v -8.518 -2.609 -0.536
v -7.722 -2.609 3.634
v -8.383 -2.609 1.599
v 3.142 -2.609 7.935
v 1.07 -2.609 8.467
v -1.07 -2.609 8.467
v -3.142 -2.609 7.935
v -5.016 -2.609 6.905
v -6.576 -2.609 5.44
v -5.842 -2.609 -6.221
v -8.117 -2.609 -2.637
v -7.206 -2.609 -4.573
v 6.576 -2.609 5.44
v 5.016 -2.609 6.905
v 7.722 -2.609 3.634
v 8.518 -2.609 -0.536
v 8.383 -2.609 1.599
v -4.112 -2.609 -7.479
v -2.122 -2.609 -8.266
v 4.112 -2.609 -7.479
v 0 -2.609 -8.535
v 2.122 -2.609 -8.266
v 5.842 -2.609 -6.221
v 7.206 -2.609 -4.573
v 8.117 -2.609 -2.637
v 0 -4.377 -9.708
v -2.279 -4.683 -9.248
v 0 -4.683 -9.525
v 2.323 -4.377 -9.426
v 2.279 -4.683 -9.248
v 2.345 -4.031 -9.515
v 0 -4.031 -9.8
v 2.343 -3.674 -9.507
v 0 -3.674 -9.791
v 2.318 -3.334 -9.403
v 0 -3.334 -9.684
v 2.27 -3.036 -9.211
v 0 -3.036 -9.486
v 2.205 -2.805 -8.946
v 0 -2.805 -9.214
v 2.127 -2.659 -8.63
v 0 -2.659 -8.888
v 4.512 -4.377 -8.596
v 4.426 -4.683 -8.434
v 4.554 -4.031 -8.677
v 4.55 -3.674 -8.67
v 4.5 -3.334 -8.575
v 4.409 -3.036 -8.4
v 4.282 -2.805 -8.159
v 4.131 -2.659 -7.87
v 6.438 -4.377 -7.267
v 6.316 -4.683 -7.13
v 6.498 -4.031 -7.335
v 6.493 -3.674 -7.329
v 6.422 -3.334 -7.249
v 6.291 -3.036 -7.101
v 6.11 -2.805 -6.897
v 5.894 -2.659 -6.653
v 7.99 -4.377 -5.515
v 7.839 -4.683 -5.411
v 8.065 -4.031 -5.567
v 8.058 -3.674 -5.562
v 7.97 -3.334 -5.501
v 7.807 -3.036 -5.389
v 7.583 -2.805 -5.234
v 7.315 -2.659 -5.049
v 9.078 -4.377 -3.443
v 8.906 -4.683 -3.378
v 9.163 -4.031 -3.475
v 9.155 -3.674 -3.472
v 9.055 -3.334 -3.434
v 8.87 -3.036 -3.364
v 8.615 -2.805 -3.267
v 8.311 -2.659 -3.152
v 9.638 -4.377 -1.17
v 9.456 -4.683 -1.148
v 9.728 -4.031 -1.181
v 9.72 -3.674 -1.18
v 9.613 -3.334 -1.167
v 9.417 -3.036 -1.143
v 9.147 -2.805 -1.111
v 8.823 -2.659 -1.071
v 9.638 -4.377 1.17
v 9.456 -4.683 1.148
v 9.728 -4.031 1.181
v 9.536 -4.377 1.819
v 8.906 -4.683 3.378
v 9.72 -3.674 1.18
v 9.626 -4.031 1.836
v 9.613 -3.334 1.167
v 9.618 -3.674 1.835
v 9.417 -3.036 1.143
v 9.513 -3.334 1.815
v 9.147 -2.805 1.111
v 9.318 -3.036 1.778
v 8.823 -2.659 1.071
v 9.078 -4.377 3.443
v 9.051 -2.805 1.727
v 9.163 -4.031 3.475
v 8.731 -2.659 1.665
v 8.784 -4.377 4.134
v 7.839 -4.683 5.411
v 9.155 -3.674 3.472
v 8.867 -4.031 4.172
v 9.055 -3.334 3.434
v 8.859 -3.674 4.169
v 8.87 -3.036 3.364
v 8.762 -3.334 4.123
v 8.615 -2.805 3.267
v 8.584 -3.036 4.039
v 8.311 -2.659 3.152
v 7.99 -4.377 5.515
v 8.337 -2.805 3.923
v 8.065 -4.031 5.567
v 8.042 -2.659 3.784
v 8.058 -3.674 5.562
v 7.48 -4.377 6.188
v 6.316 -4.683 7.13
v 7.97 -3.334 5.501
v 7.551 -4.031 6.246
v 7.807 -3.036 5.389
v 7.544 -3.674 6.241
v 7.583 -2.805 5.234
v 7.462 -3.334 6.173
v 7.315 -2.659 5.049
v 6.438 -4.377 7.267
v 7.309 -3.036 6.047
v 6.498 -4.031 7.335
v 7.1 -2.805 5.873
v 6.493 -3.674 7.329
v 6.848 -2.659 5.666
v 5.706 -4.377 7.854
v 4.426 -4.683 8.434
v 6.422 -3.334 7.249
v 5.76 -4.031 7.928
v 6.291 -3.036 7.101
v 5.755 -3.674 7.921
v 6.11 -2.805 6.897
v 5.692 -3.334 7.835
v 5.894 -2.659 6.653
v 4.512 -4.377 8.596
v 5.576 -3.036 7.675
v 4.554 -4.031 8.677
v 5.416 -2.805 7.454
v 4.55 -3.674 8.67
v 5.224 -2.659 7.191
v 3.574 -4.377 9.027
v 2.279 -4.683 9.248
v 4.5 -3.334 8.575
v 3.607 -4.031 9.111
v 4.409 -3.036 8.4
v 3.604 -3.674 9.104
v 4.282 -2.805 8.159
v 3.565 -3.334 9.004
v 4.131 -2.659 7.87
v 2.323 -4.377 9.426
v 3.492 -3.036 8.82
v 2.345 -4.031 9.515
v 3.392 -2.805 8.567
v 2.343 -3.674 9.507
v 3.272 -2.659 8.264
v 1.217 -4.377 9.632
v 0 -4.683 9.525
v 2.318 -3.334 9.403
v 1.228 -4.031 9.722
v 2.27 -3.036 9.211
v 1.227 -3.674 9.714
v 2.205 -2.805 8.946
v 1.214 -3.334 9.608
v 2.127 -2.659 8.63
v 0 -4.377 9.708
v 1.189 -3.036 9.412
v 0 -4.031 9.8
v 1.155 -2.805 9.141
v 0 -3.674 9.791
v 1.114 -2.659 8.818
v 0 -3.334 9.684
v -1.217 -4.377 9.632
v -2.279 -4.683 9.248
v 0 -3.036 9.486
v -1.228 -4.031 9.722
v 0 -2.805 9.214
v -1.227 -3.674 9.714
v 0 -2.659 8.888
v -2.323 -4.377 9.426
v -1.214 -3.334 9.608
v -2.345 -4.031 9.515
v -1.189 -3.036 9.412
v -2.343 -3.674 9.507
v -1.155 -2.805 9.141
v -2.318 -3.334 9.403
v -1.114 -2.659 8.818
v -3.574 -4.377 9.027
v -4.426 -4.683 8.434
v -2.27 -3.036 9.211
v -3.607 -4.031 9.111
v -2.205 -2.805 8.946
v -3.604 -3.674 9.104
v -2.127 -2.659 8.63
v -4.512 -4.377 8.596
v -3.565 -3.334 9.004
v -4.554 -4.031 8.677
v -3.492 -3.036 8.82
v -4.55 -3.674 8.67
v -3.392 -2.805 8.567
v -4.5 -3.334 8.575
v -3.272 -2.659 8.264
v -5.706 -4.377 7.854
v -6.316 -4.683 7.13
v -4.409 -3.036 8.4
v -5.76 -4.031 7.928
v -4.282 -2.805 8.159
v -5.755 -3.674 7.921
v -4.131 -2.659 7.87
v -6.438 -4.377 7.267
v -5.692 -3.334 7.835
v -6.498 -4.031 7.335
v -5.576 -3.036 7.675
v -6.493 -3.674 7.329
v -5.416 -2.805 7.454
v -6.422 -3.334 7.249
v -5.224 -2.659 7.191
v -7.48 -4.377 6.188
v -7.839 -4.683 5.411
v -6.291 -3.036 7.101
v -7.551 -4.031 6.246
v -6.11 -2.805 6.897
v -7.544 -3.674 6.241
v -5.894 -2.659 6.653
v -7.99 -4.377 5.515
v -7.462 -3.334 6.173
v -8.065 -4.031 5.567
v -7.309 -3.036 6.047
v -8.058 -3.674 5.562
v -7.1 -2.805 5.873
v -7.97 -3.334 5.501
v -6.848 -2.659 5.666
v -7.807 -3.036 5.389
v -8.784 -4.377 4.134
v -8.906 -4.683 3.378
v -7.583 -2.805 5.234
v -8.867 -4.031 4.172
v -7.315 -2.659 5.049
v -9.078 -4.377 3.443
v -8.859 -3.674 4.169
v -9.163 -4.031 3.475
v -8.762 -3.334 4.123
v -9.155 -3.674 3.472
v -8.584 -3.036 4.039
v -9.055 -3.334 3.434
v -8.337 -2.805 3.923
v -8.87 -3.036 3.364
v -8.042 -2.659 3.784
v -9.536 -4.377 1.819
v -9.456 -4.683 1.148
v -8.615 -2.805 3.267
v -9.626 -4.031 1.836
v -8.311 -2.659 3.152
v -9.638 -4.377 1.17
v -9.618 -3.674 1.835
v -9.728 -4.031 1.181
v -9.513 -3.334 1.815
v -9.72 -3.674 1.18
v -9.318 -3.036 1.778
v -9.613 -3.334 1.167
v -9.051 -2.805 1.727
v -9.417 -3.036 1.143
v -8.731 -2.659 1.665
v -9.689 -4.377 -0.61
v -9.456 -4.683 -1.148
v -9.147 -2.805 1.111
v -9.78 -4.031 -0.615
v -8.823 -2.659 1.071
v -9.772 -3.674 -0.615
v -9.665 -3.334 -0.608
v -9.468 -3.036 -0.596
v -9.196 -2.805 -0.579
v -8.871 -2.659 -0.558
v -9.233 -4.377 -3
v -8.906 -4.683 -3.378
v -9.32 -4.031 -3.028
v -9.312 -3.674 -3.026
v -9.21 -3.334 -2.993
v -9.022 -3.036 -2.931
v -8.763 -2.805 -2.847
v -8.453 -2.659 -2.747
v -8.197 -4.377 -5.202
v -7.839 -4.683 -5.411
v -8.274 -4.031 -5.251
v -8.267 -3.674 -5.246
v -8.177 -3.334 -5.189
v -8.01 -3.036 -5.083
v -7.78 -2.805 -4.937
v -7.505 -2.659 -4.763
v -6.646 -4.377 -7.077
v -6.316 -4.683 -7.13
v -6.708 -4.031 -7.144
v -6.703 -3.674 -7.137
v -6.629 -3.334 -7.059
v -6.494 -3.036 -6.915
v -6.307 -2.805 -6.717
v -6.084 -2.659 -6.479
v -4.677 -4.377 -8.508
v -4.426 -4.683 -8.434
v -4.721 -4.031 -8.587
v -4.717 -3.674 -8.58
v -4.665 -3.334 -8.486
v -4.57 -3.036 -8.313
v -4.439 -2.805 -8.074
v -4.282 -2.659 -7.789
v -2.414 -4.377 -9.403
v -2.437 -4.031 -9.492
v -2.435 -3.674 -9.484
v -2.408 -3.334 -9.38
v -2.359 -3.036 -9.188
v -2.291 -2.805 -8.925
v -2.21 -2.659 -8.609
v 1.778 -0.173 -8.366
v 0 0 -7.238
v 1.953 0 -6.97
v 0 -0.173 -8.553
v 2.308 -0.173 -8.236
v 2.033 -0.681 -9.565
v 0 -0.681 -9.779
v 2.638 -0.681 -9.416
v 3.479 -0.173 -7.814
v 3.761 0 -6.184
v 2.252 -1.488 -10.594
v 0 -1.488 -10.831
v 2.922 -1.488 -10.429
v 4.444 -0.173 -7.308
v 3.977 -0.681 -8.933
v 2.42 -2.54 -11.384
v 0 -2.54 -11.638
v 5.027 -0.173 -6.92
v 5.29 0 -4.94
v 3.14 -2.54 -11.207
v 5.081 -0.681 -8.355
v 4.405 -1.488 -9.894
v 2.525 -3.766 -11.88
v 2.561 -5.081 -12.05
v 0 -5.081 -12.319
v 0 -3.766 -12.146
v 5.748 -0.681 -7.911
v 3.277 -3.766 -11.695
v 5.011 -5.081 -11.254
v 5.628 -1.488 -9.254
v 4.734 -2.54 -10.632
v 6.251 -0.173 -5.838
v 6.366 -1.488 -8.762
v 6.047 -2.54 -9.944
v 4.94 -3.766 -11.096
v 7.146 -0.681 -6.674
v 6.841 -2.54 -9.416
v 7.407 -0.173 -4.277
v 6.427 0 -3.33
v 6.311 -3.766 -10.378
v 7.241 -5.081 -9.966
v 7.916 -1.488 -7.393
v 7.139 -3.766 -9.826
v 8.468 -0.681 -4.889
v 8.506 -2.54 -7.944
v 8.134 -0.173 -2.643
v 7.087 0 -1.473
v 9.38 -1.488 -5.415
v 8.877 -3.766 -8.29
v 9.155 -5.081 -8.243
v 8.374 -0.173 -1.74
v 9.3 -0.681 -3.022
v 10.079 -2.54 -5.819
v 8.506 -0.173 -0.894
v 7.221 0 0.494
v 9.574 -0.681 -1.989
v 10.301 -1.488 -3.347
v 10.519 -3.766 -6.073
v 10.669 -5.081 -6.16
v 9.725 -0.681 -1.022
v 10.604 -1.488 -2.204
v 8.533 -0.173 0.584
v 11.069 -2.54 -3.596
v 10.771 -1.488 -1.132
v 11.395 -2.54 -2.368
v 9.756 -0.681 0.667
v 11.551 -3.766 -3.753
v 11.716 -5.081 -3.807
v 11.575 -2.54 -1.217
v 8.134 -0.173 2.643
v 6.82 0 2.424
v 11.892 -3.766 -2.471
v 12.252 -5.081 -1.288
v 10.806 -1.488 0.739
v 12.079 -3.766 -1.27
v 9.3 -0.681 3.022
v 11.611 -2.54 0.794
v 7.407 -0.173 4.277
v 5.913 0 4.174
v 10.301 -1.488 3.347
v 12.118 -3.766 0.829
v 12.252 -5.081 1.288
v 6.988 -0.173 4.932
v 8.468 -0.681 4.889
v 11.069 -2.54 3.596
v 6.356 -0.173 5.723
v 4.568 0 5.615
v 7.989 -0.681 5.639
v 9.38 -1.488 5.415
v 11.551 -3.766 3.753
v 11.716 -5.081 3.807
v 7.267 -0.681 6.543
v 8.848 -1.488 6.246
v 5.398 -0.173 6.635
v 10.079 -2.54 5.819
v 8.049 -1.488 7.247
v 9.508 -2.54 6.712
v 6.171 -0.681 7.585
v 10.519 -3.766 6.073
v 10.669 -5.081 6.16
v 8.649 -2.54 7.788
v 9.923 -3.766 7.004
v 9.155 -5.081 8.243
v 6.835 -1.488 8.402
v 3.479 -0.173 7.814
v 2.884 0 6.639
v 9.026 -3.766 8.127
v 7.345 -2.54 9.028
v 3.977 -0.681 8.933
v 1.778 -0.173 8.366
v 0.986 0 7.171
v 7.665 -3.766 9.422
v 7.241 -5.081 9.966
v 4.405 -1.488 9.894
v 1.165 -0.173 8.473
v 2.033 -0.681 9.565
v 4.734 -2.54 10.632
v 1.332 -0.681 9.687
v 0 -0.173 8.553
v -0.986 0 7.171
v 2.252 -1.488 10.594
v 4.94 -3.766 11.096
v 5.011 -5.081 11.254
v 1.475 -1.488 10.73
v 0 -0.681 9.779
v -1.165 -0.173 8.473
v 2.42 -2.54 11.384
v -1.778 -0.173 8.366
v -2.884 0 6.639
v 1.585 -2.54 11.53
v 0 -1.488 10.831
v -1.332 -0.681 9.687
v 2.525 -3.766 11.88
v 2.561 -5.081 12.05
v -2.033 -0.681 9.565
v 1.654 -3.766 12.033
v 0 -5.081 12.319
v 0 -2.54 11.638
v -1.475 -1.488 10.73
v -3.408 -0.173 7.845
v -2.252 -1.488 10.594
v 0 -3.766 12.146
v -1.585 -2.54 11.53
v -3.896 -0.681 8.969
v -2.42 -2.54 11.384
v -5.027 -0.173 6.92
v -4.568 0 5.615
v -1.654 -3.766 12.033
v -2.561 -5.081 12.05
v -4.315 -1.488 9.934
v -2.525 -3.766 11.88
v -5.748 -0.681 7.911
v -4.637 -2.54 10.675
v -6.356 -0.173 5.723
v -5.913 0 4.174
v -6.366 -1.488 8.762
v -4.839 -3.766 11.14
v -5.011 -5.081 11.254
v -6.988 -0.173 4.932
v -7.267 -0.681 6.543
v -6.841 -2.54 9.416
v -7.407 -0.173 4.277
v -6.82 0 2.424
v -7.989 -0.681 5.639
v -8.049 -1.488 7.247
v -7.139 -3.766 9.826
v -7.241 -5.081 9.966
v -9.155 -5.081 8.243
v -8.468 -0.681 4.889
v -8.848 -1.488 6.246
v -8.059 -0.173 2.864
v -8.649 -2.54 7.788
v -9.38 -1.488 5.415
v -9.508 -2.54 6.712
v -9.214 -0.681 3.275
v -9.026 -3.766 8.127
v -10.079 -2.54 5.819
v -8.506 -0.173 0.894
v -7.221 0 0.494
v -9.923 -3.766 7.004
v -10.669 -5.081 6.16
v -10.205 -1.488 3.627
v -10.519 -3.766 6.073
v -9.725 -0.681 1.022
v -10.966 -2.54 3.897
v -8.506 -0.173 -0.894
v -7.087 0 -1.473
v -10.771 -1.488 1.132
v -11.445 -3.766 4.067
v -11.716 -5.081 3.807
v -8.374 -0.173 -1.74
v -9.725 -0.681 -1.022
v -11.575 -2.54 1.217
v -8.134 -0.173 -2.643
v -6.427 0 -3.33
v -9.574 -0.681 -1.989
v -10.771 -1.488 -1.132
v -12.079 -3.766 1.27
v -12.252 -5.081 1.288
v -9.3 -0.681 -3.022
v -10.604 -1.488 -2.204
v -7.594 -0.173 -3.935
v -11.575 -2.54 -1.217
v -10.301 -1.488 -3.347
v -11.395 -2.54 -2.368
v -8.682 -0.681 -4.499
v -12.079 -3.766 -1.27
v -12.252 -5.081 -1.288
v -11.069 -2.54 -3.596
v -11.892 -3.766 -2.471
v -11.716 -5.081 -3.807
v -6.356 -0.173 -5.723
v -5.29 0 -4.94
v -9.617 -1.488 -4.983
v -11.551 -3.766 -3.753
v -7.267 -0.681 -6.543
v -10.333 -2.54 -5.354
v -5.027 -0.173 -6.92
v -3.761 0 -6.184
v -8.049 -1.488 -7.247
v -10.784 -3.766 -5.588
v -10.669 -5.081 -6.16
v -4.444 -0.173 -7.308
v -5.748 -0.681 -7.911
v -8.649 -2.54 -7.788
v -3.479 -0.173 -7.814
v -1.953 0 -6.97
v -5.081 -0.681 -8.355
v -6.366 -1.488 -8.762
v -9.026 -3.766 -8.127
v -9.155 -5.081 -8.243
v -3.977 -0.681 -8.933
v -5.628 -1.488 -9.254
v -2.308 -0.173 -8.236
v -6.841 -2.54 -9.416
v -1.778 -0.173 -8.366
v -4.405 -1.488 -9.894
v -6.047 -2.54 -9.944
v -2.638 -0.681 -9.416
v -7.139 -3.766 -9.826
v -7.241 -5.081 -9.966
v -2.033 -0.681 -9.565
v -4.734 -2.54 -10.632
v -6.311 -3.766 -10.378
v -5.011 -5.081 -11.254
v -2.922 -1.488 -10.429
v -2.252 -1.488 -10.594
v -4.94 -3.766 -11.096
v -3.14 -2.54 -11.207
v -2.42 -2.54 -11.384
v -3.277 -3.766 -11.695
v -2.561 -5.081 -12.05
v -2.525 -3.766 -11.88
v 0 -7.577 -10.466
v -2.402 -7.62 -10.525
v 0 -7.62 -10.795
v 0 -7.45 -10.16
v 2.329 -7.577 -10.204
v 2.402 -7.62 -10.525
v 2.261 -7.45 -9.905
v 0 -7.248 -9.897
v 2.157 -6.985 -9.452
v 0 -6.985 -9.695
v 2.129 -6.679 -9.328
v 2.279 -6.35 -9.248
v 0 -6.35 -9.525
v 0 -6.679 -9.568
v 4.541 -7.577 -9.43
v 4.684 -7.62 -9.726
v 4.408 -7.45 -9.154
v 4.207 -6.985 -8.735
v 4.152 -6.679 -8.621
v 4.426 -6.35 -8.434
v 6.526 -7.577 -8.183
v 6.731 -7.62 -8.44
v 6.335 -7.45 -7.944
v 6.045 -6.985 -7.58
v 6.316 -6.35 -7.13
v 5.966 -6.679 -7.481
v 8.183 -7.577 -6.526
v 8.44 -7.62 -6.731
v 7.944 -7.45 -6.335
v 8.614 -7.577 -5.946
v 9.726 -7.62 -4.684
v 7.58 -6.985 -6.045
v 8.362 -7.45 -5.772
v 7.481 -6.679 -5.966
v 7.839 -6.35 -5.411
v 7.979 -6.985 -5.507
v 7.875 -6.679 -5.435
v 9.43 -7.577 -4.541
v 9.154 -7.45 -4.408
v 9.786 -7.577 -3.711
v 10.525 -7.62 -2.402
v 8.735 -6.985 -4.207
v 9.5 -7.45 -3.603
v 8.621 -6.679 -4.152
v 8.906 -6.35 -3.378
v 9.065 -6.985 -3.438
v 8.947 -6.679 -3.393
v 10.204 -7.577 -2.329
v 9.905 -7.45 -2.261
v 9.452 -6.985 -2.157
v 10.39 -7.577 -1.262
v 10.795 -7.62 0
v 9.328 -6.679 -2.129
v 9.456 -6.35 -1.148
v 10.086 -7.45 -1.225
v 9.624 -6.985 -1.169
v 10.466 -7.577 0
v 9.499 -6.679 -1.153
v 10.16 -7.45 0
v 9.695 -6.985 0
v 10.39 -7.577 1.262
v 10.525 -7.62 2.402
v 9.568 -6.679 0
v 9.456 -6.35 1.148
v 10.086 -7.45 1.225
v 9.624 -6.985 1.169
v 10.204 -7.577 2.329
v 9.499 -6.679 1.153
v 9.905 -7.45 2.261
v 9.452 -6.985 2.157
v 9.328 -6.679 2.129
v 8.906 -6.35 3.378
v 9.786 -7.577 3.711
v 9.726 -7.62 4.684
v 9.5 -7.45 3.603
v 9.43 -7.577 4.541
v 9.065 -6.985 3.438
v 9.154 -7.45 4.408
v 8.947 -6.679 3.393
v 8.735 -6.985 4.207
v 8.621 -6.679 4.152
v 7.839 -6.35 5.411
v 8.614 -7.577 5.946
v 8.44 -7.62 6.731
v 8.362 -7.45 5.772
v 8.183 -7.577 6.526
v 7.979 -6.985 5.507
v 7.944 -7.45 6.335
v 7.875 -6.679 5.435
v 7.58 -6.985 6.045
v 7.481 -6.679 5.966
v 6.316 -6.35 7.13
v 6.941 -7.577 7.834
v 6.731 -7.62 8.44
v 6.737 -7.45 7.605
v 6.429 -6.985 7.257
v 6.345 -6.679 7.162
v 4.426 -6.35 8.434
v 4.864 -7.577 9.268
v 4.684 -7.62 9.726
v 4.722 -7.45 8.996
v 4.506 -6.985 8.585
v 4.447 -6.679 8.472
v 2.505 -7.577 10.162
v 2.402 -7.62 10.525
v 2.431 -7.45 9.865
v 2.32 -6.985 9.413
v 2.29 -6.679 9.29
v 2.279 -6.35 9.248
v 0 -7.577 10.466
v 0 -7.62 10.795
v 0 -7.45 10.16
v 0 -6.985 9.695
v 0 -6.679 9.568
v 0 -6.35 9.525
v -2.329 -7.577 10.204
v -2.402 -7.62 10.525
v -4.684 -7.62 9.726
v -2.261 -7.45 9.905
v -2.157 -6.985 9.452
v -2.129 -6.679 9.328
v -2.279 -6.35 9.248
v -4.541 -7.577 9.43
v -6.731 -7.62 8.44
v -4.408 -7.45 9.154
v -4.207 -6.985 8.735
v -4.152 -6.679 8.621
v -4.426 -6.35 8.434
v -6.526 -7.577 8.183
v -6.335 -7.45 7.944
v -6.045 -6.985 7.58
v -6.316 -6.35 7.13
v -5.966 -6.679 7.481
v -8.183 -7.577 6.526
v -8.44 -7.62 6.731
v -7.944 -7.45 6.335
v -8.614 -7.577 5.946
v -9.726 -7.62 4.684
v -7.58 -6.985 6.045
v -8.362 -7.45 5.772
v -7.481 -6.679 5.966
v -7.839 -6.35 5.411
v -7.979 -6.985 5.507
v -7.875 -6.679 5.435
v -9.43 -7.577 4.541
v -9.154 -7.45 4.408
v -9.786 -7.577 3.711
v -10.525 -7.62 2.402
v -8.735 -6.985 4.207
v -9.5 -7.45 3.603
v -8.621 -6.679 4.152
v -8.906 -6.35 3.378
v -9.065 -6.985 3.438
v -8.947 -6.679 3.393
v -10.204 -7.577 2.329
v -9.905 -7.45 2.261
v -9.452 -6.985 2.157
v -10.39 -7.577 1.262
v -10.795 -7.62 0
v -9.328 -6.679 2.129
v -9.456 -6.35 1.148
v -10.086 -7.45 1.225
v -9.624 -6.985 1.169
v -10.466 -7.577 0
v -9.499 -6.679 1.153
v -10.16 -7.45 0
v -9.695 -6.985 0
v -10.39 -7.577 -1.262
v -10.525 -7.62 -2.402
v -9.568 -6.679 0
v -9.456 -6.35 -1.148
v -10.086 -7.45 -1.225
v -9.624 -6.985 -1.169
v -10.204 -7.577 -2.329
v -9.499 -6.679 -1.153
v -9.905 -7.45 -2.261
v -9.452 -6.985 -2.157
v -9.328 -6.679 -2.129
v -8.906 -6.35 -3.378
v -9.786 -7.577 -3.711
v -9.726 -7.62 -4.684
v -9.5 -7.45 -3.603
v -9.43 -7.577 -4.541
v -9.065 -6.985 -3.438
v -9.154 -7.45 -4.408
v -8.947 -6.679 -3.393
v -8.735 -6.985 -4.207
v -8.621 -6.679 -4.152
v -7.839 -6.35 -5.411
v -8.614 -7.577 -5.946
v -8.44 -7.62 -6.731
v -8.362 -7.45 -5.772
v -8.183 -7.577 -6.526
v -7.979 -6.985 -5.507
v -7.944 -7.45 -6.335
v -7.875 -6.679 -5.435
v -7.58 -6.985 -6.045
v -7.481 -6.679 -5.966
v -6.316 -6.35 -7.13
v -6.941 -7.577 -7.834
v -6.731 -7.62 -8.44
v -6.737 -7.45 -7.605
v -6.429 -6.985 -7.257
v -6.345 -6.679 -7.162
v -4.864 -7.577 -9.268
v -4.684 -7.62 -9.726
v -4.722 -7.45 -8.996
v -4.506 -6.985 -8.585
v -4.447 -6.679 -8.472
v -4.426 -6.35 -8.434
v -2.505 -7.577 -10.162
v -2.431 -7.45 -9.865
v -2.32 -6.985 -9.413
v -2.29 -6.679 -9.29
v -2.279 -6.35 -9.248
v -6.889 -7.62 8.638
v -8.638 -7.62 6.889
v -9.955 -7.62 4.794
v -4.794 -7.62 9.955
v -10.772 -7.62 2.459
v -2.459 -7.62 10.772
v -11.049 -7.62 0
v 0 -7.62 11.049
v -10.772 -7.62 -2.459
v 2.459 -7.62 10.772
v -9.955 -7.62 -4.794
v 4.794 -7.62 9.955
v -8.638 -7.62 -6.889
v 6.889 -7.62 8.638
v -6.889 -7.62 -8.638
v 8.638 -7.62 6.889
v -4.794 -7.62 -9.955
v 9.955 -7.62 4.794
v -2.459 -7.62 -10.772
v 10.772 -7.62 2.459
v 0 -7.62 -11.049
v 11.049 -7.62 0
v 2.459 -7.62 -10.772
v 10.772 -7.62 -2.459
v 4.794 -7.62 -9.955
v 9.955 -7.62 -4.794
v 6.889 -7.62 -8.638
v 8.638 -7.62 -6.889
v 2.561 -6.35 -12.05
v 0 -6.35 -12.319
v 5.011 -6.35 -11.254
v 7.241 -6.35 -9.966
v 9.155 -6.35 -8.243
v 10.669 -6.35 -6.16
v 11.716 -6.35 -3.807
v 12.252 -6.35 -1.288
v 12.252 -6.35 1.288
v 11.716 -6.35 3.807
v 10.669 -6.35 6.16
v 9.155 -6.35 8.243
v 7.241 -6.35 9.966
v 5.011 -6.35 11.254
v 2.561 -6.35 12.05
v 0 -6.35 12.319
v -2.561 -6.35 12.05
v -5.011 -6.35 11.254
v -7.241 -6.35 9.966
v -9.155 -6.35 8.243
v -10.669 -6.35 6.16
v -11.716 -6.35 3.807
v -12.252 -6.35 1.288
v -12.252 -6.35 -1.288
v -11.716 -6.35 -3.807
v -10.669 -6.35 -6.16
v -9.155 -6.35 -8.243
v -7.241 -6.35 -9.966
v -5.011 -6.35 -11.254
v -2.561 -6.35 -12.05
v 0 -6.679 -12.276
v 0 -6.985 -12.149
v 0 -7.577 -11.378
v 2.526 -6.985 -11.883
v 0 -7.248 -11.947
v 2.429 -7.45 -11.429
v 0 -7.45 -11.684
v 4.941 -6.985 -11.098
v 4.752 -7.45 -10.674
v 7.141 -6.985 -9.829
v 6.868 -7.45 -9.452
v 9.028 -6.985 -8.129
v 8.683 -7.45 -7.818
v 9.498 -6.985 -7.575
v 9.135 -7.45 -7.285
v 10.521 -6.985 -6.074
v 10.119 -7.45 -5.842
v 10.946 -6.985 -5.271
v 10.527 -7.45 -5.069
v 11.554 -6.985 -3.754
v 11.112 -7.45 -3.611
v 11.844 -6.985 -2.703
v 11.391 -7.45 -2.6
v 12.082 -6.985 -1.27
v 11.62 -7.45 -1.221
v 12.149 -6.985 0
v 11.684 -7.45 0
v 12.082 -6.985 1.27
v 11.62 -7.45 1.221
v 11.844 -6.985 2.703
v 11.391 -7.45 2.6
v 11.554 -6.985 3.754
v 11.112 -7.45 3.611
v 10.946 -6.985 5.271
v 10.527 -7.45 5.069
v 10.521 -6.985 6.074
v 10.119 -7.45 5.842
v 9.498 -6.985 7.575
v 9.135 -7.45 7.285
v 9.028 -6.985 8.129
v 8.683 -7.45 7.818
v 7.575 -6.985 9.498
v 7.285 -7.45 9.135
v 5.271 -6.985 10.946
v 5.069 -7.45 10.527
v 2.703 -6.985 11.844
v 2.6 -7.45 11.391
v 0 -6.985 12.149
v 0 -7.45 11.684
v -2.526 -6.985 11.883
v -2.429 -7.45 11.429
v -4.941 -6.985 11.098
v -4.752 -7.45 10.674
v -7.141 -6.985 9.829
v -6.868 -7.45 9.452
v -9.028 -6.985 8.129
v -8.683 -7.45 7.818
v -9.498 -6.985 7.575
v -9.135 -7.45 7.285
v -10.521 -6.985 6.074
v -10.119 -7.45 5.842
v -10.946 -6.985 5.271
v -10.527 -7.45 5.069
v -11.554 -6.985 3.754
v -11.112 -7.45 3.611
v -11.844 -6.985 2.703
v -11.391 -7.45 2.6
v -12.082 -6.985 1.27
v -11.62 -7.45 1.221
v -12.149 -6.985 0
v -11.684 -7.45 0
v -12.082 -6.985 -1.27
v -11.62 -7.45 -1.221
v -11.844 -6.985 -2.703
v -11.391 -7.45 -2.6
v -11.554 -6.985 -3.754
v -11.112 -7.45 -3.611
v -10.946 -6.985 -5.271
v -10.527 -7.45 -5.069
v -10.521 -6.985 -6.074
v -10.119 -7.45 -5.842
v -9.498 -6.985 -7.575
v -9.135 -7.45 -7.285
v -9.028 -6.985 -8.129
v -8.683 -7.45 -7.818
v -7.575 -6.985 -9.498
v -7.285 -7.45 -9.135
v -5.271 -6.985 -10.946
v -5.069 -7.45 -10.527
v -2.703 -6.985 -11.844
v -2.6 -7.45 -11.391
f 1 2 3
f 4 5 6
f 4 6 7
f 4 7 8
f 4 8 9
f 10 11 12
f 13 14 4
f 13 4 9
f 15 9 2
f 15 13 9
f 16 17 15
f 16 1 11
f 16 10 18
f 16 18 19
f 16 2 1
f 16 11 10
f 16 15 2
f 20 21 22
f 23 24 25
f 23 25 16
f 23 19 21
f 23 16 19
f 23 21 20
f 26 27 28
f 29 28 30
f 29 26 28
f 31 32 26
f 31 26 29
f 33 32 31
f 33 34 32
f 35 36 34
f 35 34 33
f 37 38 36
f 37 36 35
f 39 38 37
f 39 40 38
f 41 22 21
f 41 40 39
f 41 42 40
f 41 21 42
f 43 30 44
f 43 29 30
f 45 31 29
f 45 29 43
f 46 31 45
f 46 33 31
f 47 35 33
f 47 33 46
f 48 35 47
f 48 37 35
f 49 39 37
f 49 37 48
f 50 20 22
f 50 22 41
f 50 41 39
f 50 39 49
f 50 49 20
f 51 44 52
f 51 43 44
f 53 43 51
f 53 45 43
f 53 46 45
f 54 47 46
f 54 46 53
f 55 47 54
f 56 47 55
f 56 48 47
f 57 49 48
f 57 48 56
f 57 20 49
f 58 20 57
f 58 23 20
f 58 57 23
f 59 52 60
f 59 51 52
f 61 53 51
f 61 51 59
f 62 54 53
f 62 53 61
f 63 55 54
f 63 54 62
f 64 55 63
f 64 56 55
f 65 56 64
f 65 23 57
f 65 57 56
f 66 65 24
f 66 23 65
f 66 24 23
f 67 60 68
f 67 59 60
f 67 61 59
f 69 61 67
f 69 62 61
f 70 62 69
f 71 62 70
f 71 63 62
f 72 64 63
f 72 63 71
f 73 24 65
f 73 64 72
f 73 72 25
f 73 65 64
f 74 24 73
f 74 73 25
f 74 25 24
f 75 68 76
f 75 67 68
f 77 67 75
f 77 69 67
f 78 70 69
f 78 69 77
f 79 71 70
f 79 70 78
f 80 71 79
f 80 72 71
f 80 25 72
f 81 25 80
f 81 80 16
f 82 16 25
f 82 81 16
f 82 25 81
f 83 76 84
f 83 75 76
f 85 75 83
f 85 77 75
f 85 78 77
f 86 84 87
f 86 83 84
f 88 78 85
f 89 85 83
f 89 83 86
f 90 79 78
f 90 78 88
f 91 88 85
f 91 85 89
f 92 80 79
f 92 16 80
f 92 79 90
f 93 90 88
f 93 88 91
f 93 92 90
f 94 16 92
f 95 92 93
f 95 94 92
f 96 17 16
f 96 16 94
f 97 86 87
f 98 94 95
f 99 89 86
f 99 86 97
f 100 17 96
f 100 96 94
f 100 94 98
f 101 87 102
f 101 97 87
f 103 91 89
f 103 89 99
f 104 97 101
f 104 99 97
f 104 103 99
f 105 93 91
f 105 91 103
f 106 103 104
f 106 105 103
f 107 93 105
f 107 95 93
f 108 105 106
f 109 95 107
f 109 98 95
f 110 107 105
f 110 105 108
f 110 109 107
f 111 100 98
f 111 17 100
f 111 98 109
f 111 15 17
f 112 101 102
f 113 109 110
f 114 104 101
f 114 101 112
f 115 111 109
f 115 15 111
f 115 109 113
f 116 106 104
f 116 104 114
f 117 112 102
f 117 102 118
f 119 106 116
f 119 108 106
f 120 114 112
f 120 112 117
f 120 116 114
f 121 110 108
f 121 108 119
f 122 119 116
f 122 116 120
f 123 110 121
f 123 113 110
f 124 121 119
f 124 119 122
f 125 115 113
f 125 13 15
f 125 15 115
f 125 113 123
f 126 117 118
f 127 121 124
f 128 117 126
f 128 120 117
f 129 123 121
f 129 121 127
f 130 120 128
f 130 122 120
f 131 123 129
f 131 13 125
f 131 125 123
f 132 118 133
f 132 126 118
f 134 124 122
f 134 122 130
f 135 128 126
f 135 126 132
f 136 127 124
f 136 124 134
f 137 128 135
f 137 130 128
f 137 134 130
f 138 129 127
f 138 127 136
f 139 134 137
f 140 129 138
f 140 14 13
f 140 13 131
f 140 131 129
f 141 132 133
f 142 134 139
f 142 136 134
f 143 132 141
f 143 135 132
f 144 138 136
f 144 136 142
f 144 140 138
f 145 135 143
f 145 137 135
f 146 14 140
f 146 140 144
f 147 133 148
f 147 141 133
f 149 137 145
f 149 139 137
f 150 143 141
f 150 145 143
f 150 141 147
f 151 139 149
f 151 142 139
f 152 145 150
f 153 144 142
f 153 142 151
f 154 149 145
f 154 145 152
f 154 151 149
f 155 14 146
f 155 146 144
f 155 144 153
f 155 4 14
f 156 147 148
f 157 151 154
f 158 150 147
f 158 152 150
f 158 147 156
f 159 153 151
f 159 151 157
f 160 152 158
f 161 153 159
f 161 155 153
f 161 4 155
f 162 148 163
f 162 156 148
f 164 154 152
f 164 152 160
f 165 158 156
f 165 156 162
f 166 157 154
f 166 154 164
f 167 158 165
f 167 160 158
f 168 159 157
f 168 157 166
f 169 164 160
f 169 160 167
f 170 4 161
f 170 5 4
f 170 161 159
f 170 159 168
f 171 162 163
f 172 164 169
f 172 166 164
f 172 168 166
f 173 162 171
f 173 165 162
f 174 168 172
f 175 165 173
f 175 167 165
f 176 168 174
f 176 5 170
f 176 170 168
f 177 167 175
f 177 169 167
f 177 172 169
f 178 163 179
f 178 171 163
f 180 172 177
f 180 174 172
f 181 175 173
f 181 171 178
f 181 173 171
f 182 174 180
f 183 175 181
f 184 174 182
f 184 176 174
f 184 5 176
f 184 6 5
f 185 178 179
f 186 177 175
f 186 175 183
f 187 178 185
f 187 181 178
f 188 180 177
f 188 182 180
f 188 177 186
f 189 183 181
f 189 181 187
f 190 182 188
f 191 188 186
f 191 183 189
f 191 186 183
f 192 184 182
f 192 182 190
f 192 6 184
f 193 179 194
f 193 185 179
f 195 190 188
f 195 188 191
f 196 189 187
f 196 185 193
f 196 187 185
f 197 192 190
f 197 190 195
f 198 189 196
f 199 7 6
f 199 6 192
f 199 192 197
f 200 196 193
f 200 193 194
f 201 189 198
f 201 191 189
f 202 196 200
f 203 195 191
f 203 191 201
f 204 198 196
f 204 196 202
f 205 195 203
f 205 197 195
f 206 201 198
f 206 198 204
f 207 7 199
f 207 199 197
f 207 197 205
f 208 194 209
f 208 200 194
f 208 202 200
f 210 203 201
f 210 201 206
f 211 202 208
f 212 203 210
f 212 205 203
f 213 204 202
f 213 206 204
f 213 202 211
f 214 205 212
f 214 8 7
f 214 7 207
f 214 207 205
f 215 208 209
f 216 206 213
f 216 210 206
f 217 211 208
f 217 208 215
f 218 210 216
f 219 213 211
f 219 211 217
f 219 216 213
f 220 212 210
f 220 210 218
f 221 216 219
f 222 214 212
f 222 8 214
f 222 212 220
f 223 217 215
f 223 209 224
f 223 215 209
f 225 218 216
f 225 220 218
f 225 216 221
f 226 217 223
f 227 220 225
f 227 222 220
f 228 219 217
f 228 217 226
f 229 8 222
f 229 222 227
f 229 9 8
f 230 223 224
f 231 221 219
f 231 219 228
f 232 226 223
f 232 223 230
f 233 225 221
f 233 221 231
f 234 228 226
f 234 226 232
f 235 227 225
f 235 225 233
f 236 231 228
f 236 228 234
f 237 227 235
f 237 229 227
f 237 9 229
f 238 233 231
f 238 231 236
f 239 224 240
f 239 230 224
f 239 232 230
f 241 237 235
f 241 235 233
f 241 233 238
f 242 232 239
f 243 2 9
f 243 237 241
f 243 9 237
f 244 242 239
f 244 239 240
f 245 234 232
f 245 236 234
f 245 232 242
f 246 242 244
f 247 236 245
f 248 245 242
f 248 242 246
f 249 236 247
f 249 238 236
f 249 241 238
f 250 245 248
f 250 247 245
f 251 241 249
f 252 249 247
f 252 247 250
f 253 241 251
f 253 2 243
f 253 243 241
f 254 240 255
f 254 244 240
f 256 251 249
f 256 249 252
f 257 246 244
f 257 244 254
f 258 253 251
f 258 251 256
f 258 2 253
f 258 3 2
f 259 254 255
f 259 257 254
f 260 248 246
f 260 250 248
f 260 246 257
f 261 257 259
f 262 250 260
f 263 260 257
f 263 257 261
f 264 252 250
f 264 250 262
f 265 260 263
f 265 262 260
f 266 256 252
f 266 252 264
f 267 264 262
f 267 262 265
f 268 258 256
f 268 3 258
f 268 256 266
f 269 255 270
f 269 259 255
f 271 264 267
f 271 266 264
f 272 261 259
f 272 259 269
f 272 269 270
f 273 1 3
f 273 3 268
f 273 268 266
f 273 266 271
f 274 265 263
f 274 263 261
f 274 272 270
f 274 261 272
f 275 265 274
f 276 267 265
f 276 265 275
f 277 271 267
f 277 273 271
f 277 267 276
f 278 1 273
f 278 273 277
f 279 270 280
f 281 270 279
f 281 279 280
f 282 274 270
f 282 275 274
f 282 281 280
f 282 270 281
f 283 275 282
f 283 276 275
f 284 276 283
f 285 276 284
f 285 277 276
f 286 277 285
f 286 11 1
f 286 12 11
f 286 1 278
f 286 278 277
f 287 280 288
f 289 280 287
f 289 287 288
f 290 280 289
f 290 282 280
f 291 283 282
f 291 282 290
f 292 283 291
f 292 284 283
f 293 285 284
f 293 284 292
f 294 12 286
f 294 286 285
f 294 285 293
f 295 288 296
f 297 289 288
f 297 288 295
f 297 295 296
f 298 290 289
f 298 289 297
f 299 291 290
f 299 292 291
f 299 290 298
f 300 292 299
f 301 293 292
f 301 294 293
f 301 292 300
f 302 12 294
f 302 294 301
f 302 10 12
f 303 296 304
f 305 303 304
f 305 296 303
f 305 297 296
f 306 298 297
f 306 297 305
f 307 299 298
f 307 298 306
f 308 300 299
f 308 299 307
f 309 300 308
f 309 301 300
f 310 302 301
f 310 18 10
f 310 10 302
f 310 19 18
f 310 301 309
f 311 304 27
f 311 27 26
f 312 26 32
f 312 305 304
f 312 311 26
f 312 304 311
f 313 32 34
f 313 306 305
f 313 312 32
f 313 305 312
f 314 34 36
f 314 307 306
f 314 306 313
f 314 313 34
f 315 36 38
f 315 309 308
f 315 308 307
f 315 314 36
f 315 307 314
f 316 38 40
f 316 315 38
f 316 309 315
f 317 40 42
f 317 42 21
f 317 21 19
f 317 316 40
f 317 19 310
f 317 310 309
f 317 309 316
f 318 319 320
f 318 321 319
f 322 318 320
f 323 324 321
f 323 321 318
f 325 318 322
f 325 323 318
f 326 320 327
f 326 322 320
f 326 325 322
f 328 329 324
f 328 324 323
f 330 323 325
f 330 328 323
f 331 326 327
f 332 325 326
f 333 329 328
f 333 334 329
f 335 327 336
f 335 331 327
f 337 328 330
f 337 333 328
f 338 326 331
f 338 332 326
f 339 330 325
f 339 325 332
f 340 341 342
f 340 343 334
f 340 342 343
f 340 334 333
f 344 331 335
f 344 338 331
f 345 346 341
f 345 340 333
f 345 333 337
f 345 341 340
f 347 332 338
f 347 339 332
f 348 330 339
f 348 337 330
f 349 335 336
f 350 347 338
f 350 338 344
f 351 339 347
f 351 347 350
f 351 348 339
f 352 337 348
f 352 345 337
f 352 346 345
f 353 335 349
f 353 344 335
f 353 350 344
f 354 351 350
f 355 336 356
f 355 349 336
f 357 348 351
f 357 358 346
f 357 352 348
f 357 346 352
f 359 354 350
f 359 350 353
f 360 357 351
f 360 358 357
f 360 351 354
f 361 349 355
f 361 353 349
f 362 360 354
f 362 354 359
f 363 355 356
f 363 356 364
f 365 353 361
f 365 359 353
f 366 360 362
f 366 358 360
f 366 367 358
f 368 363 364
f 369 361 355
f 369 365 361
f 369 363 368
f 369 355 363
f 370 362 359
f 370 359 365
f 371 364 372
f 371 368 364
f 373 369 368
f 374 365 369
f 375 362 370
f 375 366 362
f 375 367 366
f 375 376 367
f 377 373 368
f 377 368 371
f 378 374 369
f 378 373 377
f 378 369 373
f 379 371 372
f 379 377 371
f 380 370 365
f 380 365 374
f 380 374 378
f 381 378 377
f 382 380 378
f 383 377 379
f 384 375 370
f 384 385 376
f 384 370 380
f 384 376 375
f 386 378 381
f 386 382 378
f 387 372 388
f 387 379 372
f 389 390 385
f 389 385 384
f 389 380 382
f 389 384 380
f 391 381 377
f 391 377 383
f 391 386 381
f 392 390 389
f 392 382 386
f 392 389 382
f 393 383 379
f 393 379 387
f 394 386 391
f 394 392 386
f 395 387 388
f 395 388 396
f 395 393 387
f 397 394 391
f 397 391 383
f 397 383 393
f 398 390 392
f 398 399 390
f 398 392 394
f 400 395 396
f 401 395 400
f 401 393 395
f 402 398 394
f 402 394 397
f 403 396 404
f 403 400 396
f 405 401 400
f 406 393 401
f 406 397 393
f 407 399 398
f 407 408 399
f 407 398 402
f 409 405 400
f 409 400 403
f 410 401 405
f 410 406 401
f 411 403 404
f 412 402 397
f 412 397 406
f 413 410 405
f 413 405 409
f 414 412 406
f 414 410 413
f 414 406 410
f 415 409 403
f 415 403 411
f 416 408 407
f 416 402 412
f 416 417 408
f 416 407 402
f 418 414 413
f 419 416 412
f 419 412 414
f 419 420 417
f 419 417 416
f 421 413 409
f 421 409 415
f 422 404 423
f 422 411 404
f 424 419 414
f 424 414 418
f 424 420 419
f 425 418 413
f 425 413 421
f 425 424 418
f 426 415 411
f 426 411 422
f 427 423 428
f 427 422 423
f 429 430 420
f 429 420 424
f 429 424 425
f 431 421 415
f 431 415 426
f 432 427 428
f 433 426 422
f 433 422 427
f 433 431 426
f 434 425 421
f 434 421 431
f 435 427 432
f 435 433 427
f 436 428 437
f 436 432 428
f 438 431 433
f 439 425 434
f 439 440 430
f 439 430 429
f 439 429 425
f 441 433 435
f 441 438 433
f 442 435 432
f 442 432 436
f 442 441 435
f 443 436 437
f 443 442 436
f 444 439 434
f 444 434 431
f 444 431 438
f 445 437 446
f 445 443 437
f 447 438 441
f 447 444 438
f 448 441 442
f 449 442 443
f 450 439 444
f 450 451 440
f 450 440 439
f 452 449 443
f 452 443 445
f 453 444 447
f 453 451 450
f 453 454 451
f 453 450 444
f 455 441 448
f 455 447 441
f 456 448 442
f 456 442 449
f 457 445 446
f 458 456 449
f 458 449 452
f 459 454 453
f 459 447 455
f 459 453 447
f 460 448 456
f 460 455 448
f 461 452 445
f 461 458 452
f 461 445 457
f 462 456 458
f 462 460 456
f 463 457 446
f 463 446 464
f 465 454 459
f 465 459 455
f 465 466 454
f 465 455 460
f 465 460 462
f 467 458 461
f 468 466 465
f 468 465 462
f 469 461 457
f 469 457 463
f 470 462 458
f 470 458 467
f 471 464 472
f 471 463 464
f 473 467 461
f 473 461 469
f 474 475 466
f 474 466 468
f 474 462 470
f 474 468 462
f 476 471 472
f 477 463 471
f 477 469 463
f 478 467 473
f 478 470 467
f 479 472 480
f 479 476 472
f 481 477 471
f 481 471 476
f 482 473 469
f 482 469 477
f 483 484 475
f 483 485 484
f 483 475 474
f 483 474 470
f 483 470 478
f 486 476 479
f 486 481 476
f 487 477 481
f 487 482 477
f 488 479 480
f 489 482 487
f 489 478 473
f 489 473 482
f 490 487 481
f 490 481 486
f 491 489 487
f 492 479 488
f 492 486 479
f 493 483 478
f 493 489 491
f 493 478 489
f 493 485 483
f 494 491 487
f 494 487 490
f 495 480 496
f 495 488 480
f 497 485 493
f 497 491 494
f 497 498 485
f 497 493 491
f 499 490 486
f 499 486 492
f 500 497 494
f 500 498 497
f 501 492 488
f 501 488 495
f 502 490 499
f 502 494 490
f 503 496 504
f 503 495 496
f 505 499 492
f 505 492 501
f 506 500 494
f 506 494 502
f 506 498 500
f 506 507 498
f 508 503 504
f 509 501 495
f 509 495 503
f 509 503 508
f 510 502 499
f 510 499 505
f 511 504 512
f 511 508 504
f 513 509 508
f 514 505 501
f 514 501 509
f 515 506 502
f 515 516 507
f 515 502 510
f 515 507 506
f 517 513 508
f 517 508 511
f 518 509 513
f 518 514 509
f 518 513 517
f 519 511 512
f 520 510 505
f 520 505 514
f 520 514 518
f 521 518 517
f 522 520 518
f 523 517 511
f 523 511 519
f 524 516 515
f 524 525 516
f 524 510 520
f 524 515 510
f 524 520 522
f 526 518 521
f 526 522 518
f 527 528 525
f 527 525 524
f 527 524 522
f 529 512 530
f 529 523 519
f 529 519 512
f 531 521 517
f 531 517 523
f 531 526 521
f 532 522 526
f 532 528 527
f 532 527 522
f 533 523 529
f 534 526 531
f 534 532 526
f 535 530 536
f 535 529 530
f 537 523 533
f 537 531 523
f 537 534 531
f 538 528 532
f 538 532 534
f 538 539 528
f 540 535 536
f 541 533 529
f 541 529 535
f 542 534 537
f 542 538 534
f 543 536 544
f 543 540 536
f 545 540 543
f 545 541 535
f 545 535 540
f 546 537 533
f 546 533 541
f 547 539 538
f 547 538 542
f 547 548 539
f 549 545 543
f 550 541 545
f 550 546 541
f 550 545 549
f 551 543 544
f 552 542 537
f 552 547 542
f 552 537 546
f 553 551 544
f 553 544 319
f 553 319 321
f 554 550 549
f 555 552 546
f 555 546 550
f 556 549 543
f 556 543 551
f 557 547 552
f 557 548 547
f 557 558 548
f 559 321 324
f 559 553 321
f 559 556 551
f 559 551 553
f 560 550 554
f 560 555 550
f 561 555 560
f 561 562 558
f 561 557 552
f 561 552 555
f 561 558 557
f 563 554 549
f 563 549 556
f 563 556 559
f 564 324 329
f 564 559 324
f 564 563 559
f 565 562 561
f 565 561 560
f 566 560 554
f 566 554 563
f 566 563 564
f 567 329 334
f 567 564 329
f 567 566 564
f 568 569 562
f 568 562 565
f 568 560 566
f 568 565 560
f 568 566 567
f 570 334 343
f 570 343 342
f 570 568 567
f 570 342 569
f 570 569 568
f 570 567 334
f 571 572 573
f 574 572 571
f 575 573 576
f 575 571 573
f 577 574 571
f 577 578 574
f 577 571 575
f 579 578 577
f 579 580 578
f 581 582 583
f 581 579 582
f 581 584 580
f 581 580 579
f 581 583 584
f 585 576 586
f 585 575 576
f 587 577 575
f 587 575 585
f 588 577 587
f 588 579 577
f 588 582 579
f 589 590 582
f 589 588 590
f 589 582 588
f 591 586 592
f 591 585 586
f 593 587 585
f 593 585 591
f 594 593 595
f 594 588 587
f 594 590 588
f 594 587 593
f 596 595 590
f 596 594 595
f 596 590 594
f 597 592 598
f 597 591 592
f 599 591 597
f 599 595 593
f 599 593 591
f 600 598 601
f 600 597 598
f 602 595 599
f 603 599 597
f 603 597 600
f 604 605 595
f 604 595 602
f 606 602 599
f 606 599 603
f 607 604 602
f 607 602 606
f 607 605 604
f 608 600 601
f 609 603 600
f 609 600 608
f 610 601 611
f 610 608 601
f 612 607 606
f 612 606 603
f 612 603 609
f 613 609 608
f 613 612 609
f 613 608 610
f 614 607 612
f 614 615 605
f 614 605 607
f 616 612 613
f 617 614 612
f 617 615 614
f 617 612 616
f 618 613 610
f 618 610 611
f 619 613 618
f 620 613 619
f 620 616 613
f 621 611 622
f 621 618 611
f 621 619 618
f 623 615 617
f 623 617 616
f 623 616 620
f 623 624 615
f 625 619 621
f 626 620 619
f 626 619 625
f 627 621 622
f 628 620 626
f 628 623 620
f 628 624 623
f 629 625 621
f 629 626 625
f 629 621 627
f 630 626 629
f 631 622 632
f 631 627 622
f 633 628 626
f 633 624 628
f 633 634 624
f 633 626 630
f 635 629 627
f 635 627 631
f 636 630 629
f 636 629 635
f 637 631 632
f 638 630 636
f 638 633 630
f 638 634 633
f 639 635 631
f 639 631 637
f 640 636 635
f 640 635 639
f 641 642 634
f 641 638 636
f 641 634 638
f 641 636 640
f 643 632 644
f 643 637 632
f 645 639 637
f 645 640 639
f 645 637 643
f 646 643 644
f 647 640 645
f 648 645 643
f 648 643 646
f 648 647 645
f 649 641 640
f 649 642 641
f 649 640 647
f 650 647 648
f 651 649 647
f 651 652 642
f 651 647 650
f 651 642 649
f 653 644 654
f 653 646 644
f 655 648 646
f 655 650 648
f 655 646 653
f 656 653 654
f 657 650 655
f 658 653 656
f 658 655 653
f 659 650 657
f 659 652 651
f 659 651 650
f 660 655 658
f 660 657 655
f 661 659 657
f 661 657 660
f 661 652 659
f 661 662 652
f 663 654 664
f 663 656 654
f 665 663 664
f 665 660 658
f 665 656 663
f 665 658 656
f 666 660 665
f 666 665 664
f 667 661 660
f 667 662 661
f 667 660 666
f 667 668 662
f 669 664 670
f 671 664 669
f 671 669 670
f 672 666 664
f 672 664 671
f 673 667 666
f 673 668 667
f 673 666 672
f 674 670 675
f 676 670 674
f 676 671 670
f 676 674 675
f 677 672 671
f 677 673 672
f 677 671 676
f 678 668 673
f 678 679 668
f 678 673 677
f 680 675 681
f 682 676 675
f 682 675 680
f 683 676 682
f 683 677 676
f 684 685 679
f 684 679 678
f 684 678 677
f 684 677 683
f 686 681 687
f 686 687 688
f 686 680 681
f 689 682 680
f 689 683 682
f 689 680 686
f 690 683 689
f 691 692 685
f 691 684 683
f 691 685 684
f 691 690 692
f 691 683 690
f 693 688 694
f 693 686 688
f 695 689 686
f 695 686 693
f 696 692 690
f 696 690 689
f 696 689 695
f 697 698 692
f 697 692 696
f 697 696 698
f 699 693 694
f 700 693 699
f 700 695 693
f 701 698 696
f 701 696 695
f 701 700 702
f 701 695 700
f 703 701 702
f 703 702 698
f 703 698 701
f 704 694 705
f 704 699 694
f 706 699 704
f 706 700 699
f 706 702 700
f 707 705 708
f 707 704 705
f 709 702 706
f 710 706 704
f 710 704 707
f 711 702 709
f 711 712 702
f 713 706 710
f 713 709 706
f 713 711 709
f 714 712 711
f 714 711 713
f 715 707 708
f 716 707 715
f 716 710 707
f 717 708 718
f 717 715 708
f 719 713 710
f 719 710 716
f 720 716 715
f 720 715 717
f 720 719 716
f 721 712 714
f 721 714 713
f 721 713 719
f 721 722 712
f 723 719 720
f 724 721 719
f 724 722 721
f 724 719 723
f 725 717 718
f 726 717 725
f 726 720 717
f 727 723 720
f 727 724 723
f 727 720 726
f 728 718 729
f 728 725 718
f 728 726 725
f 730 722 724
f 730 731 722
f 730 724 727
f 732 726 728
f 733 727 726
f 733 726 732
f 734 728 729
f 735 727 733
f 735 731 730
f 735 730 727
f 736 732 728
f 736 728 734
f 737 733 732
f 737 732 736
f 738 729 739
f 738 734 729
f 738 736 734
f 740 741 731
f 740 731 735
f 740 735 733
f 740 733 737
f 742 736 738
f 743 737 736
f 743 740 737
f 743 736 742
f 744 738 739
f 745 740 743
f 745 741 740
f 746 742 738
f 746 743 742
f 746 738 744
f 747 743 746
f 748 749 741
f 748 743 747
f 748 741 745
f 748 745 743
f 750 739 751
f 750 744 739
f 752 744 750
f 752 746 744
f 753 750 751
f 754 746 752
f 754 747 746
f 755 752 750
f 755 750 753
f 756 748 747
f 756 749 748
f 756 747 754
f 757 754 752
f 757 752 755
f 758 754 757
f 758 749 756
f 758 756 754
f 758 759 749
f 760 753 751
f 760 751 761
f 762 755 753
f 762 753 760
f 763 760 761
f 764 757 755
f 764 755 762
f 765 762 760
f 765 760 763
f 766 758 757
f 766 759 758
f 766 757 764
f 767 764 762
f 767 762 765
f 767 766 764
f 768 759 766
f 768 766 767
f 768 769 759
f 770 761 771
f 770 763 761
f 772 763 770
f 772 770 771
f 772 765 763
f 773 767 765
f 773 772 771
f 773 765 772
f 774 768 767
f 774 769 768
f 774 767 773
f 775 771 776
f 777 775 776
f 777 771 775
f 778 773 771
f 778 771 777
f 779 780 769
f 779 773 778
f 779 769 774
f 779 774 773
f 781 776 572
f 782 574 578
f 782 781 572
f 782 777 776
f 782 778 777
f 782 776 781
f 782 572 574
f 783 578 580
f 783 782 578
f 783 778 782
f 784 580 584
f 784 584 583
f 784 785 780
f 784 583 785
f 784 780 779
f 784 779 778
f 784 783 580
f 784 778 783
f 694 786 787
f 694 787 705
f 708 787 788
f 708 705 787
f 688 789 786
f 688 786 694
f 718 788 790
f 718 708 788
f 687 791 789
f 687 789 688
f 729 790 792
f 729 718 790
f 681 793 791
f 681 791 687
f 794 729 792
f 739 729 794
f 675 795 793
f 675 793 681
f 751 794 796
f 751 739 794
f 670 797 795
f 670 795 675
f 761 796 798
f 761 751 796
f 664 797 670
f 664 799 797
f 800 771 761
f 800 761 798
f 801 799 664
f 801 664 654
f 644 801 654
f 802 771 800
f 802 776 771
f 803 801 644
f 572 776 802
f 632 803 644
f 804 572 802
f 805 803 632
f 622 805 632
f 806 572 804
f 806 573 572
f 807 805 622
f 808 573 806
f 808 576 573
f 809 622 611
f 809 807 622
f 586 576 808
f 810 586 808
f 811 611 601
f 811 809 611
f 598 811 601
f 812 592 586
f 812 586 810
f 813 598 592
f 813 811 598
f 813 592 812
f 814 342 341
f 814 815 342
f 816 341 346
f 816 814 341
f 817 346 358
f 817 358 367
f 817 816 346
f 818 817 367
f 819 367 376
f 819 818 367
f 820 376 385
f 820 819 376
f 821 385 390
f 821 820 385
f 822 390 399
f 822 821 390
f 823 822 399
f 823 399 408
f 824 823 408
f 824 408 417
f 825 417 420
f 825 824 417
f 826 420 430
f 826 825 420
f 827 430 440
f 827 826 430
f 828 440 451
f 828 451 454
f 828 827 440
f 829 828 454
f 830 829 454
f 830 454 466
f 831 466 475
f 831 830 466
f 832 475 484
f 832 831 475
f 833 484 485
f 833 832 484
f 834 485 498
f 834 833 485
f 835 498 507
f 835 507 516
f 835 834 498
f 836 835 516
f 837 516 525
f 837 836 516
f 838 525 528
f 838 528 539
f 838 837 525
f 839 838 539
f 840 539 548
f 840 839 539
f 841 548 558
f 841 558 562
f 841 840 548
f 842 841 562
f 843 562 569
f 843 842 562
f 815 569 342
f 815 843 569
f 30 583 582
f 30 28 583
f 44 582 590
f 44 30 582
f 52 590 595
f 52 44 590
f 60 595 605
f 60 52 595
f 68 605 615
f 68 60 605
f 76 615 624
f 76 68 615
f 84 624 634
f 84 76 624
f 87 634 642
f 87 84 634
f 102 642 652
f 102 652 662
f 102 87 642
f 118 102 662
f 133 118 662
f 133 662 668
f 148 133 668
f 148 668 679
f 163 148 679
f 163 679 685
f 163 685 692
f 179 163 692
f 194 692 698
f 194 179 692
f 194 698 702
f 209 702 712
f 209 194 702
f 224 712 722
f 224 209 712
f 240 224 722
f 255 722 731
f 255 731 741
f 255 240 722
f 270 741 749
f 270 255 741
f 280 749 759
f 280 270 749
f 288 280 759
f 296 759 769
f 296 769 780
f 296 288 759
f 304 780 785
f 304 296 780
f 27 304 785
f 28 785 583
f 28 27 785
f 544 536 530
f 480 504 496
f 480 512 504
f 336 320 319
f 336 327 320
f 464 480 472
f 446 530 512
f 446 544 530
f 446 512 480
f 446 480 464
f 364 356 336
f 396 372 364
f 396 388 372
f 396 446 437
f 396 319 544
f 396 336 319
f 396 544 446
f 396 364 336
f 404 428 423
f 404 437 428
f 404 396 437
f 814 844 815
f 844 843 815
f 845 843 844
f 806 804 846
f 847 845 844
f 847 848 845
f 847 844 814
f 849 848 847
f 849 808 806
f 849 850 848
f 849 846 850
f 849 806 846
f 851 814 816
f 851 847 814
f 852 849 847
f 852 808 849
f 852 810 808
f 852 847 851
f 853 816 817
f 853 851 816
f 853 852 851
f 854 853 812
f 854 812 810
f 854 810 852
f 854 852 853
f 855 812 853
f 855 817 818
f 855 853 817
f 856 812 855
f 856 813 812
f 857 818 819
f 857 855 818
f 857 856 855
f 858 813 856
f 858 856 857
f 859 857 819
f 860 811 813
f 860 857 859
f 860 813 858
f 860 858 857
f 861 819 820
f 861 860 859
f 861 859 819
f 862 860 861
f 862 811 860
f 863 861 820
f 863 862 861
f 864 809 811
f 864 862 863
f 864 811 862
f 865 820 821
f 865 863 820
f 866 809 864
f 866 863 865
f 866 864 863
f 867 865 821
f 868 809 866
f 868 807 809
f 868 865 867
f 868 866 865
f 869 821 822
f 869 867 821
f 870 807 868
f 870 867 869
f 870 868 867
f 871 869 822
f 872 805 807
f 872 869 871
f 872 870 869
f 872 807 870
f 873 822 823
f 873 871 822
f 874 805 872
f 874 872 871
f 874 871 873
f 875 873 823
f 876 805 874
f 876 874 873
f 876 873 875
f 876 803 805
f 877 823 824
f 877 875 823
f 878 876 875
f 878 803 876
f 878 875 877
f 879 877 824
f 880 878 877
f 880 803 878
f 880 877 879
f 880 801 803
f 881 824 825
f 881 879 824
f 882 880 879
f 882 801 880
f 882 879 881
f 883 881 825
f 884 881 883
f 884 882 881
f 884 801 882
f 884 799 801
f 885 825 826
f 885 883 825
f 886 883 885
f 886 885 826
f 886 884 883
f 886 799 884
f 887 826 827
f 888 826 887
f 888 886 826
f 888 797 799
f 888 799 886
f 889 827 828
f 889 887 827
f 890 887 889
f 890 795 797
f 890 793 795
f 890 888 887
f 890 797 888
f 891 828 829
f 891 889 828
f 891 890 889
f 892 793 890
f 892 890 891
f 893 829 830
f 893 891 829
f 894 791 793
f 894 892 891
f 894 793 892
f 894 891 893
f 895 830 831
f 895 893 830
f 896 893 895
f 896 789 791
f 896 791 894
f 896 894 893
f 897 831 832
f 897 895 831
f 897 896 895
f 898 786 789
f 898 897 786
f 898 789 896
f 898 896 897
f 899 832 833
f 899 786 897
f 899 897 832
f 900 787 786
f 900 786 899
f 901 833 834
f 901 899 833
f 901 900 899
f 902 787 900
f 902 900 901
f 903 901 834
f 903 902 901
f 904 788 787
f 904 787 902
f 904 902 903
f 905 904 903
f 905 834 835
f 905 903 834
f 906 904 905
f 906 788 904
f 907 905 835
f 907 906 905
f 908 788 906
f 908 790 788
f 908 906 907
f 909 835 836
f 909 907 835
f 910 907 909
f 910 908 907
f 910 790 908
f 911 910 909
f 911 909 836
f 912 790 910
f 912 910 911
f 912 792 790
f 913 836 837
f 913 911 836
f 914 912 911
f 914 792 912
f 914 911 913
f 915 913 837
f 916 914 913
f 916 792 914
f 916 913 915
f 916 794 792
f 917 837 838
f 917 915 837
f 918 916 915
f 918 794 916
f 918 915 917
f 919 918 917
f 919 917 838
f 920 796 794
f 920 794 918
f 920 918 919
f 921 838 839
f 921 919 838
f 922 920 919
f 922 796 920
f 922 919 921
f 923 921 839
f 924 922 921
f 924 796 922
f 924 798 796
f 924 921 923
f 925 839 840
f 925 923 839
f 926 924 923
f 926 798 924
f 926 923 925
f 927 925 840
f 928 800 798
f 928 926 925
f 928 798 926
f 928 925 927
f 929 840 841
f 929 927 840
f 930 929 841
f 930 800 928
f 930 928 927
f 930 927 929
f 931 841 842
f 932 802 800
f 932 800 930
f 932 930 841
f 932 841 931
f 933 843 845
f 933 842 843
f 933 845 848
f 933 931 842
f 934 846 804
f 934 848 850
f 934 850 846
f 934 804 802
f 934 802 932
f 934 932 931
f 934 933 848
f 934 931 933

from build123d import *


with BuildPart() as part:
    # Sketch3 → Revolve1 (revolve)
    with BuildSketch(Plane(origin=(0, 0, 0), x_dir=(0, 0, -1), z_dir=(1, 0, 0))):
        with BuildLine():
            Line((12.319000296, -5.080996249), (12.319000296, -6.349750932))
            ThreePointArc((12.319000296, -6.349750932), (11.946952958, -7.247952662), (11.048751227, -7.62))
            Line((11.048751227, -7.62), (10.795249364, -7.62))
            ThreePointArc((10.795249364, -7.62), (9.897047634, -7.247952662), (9.525000296, -6.349750932))
            Line((9.525000296, -6.349750932), (9.525000296, -4.68336138))
            ThreePointArc((9.525000296, -4.68336138), (9.684048002, -3.333611598), (8.534504688, -2.60858))
            Line((8.534504688, -2.60858), (0, -2.60858))
            Line((0, -2.60858), (0, 0))
            Line((0, 0), (7.238004047, 0))
            ThreePointArc((7.238004047, 0), (10.83081095, -1.488189346), (12.319000296, -5.080996249))
        make_face()
    revolve(axis=Axis((0, -2.60858, 0), (0, -1, 0)))


solid = part.part
